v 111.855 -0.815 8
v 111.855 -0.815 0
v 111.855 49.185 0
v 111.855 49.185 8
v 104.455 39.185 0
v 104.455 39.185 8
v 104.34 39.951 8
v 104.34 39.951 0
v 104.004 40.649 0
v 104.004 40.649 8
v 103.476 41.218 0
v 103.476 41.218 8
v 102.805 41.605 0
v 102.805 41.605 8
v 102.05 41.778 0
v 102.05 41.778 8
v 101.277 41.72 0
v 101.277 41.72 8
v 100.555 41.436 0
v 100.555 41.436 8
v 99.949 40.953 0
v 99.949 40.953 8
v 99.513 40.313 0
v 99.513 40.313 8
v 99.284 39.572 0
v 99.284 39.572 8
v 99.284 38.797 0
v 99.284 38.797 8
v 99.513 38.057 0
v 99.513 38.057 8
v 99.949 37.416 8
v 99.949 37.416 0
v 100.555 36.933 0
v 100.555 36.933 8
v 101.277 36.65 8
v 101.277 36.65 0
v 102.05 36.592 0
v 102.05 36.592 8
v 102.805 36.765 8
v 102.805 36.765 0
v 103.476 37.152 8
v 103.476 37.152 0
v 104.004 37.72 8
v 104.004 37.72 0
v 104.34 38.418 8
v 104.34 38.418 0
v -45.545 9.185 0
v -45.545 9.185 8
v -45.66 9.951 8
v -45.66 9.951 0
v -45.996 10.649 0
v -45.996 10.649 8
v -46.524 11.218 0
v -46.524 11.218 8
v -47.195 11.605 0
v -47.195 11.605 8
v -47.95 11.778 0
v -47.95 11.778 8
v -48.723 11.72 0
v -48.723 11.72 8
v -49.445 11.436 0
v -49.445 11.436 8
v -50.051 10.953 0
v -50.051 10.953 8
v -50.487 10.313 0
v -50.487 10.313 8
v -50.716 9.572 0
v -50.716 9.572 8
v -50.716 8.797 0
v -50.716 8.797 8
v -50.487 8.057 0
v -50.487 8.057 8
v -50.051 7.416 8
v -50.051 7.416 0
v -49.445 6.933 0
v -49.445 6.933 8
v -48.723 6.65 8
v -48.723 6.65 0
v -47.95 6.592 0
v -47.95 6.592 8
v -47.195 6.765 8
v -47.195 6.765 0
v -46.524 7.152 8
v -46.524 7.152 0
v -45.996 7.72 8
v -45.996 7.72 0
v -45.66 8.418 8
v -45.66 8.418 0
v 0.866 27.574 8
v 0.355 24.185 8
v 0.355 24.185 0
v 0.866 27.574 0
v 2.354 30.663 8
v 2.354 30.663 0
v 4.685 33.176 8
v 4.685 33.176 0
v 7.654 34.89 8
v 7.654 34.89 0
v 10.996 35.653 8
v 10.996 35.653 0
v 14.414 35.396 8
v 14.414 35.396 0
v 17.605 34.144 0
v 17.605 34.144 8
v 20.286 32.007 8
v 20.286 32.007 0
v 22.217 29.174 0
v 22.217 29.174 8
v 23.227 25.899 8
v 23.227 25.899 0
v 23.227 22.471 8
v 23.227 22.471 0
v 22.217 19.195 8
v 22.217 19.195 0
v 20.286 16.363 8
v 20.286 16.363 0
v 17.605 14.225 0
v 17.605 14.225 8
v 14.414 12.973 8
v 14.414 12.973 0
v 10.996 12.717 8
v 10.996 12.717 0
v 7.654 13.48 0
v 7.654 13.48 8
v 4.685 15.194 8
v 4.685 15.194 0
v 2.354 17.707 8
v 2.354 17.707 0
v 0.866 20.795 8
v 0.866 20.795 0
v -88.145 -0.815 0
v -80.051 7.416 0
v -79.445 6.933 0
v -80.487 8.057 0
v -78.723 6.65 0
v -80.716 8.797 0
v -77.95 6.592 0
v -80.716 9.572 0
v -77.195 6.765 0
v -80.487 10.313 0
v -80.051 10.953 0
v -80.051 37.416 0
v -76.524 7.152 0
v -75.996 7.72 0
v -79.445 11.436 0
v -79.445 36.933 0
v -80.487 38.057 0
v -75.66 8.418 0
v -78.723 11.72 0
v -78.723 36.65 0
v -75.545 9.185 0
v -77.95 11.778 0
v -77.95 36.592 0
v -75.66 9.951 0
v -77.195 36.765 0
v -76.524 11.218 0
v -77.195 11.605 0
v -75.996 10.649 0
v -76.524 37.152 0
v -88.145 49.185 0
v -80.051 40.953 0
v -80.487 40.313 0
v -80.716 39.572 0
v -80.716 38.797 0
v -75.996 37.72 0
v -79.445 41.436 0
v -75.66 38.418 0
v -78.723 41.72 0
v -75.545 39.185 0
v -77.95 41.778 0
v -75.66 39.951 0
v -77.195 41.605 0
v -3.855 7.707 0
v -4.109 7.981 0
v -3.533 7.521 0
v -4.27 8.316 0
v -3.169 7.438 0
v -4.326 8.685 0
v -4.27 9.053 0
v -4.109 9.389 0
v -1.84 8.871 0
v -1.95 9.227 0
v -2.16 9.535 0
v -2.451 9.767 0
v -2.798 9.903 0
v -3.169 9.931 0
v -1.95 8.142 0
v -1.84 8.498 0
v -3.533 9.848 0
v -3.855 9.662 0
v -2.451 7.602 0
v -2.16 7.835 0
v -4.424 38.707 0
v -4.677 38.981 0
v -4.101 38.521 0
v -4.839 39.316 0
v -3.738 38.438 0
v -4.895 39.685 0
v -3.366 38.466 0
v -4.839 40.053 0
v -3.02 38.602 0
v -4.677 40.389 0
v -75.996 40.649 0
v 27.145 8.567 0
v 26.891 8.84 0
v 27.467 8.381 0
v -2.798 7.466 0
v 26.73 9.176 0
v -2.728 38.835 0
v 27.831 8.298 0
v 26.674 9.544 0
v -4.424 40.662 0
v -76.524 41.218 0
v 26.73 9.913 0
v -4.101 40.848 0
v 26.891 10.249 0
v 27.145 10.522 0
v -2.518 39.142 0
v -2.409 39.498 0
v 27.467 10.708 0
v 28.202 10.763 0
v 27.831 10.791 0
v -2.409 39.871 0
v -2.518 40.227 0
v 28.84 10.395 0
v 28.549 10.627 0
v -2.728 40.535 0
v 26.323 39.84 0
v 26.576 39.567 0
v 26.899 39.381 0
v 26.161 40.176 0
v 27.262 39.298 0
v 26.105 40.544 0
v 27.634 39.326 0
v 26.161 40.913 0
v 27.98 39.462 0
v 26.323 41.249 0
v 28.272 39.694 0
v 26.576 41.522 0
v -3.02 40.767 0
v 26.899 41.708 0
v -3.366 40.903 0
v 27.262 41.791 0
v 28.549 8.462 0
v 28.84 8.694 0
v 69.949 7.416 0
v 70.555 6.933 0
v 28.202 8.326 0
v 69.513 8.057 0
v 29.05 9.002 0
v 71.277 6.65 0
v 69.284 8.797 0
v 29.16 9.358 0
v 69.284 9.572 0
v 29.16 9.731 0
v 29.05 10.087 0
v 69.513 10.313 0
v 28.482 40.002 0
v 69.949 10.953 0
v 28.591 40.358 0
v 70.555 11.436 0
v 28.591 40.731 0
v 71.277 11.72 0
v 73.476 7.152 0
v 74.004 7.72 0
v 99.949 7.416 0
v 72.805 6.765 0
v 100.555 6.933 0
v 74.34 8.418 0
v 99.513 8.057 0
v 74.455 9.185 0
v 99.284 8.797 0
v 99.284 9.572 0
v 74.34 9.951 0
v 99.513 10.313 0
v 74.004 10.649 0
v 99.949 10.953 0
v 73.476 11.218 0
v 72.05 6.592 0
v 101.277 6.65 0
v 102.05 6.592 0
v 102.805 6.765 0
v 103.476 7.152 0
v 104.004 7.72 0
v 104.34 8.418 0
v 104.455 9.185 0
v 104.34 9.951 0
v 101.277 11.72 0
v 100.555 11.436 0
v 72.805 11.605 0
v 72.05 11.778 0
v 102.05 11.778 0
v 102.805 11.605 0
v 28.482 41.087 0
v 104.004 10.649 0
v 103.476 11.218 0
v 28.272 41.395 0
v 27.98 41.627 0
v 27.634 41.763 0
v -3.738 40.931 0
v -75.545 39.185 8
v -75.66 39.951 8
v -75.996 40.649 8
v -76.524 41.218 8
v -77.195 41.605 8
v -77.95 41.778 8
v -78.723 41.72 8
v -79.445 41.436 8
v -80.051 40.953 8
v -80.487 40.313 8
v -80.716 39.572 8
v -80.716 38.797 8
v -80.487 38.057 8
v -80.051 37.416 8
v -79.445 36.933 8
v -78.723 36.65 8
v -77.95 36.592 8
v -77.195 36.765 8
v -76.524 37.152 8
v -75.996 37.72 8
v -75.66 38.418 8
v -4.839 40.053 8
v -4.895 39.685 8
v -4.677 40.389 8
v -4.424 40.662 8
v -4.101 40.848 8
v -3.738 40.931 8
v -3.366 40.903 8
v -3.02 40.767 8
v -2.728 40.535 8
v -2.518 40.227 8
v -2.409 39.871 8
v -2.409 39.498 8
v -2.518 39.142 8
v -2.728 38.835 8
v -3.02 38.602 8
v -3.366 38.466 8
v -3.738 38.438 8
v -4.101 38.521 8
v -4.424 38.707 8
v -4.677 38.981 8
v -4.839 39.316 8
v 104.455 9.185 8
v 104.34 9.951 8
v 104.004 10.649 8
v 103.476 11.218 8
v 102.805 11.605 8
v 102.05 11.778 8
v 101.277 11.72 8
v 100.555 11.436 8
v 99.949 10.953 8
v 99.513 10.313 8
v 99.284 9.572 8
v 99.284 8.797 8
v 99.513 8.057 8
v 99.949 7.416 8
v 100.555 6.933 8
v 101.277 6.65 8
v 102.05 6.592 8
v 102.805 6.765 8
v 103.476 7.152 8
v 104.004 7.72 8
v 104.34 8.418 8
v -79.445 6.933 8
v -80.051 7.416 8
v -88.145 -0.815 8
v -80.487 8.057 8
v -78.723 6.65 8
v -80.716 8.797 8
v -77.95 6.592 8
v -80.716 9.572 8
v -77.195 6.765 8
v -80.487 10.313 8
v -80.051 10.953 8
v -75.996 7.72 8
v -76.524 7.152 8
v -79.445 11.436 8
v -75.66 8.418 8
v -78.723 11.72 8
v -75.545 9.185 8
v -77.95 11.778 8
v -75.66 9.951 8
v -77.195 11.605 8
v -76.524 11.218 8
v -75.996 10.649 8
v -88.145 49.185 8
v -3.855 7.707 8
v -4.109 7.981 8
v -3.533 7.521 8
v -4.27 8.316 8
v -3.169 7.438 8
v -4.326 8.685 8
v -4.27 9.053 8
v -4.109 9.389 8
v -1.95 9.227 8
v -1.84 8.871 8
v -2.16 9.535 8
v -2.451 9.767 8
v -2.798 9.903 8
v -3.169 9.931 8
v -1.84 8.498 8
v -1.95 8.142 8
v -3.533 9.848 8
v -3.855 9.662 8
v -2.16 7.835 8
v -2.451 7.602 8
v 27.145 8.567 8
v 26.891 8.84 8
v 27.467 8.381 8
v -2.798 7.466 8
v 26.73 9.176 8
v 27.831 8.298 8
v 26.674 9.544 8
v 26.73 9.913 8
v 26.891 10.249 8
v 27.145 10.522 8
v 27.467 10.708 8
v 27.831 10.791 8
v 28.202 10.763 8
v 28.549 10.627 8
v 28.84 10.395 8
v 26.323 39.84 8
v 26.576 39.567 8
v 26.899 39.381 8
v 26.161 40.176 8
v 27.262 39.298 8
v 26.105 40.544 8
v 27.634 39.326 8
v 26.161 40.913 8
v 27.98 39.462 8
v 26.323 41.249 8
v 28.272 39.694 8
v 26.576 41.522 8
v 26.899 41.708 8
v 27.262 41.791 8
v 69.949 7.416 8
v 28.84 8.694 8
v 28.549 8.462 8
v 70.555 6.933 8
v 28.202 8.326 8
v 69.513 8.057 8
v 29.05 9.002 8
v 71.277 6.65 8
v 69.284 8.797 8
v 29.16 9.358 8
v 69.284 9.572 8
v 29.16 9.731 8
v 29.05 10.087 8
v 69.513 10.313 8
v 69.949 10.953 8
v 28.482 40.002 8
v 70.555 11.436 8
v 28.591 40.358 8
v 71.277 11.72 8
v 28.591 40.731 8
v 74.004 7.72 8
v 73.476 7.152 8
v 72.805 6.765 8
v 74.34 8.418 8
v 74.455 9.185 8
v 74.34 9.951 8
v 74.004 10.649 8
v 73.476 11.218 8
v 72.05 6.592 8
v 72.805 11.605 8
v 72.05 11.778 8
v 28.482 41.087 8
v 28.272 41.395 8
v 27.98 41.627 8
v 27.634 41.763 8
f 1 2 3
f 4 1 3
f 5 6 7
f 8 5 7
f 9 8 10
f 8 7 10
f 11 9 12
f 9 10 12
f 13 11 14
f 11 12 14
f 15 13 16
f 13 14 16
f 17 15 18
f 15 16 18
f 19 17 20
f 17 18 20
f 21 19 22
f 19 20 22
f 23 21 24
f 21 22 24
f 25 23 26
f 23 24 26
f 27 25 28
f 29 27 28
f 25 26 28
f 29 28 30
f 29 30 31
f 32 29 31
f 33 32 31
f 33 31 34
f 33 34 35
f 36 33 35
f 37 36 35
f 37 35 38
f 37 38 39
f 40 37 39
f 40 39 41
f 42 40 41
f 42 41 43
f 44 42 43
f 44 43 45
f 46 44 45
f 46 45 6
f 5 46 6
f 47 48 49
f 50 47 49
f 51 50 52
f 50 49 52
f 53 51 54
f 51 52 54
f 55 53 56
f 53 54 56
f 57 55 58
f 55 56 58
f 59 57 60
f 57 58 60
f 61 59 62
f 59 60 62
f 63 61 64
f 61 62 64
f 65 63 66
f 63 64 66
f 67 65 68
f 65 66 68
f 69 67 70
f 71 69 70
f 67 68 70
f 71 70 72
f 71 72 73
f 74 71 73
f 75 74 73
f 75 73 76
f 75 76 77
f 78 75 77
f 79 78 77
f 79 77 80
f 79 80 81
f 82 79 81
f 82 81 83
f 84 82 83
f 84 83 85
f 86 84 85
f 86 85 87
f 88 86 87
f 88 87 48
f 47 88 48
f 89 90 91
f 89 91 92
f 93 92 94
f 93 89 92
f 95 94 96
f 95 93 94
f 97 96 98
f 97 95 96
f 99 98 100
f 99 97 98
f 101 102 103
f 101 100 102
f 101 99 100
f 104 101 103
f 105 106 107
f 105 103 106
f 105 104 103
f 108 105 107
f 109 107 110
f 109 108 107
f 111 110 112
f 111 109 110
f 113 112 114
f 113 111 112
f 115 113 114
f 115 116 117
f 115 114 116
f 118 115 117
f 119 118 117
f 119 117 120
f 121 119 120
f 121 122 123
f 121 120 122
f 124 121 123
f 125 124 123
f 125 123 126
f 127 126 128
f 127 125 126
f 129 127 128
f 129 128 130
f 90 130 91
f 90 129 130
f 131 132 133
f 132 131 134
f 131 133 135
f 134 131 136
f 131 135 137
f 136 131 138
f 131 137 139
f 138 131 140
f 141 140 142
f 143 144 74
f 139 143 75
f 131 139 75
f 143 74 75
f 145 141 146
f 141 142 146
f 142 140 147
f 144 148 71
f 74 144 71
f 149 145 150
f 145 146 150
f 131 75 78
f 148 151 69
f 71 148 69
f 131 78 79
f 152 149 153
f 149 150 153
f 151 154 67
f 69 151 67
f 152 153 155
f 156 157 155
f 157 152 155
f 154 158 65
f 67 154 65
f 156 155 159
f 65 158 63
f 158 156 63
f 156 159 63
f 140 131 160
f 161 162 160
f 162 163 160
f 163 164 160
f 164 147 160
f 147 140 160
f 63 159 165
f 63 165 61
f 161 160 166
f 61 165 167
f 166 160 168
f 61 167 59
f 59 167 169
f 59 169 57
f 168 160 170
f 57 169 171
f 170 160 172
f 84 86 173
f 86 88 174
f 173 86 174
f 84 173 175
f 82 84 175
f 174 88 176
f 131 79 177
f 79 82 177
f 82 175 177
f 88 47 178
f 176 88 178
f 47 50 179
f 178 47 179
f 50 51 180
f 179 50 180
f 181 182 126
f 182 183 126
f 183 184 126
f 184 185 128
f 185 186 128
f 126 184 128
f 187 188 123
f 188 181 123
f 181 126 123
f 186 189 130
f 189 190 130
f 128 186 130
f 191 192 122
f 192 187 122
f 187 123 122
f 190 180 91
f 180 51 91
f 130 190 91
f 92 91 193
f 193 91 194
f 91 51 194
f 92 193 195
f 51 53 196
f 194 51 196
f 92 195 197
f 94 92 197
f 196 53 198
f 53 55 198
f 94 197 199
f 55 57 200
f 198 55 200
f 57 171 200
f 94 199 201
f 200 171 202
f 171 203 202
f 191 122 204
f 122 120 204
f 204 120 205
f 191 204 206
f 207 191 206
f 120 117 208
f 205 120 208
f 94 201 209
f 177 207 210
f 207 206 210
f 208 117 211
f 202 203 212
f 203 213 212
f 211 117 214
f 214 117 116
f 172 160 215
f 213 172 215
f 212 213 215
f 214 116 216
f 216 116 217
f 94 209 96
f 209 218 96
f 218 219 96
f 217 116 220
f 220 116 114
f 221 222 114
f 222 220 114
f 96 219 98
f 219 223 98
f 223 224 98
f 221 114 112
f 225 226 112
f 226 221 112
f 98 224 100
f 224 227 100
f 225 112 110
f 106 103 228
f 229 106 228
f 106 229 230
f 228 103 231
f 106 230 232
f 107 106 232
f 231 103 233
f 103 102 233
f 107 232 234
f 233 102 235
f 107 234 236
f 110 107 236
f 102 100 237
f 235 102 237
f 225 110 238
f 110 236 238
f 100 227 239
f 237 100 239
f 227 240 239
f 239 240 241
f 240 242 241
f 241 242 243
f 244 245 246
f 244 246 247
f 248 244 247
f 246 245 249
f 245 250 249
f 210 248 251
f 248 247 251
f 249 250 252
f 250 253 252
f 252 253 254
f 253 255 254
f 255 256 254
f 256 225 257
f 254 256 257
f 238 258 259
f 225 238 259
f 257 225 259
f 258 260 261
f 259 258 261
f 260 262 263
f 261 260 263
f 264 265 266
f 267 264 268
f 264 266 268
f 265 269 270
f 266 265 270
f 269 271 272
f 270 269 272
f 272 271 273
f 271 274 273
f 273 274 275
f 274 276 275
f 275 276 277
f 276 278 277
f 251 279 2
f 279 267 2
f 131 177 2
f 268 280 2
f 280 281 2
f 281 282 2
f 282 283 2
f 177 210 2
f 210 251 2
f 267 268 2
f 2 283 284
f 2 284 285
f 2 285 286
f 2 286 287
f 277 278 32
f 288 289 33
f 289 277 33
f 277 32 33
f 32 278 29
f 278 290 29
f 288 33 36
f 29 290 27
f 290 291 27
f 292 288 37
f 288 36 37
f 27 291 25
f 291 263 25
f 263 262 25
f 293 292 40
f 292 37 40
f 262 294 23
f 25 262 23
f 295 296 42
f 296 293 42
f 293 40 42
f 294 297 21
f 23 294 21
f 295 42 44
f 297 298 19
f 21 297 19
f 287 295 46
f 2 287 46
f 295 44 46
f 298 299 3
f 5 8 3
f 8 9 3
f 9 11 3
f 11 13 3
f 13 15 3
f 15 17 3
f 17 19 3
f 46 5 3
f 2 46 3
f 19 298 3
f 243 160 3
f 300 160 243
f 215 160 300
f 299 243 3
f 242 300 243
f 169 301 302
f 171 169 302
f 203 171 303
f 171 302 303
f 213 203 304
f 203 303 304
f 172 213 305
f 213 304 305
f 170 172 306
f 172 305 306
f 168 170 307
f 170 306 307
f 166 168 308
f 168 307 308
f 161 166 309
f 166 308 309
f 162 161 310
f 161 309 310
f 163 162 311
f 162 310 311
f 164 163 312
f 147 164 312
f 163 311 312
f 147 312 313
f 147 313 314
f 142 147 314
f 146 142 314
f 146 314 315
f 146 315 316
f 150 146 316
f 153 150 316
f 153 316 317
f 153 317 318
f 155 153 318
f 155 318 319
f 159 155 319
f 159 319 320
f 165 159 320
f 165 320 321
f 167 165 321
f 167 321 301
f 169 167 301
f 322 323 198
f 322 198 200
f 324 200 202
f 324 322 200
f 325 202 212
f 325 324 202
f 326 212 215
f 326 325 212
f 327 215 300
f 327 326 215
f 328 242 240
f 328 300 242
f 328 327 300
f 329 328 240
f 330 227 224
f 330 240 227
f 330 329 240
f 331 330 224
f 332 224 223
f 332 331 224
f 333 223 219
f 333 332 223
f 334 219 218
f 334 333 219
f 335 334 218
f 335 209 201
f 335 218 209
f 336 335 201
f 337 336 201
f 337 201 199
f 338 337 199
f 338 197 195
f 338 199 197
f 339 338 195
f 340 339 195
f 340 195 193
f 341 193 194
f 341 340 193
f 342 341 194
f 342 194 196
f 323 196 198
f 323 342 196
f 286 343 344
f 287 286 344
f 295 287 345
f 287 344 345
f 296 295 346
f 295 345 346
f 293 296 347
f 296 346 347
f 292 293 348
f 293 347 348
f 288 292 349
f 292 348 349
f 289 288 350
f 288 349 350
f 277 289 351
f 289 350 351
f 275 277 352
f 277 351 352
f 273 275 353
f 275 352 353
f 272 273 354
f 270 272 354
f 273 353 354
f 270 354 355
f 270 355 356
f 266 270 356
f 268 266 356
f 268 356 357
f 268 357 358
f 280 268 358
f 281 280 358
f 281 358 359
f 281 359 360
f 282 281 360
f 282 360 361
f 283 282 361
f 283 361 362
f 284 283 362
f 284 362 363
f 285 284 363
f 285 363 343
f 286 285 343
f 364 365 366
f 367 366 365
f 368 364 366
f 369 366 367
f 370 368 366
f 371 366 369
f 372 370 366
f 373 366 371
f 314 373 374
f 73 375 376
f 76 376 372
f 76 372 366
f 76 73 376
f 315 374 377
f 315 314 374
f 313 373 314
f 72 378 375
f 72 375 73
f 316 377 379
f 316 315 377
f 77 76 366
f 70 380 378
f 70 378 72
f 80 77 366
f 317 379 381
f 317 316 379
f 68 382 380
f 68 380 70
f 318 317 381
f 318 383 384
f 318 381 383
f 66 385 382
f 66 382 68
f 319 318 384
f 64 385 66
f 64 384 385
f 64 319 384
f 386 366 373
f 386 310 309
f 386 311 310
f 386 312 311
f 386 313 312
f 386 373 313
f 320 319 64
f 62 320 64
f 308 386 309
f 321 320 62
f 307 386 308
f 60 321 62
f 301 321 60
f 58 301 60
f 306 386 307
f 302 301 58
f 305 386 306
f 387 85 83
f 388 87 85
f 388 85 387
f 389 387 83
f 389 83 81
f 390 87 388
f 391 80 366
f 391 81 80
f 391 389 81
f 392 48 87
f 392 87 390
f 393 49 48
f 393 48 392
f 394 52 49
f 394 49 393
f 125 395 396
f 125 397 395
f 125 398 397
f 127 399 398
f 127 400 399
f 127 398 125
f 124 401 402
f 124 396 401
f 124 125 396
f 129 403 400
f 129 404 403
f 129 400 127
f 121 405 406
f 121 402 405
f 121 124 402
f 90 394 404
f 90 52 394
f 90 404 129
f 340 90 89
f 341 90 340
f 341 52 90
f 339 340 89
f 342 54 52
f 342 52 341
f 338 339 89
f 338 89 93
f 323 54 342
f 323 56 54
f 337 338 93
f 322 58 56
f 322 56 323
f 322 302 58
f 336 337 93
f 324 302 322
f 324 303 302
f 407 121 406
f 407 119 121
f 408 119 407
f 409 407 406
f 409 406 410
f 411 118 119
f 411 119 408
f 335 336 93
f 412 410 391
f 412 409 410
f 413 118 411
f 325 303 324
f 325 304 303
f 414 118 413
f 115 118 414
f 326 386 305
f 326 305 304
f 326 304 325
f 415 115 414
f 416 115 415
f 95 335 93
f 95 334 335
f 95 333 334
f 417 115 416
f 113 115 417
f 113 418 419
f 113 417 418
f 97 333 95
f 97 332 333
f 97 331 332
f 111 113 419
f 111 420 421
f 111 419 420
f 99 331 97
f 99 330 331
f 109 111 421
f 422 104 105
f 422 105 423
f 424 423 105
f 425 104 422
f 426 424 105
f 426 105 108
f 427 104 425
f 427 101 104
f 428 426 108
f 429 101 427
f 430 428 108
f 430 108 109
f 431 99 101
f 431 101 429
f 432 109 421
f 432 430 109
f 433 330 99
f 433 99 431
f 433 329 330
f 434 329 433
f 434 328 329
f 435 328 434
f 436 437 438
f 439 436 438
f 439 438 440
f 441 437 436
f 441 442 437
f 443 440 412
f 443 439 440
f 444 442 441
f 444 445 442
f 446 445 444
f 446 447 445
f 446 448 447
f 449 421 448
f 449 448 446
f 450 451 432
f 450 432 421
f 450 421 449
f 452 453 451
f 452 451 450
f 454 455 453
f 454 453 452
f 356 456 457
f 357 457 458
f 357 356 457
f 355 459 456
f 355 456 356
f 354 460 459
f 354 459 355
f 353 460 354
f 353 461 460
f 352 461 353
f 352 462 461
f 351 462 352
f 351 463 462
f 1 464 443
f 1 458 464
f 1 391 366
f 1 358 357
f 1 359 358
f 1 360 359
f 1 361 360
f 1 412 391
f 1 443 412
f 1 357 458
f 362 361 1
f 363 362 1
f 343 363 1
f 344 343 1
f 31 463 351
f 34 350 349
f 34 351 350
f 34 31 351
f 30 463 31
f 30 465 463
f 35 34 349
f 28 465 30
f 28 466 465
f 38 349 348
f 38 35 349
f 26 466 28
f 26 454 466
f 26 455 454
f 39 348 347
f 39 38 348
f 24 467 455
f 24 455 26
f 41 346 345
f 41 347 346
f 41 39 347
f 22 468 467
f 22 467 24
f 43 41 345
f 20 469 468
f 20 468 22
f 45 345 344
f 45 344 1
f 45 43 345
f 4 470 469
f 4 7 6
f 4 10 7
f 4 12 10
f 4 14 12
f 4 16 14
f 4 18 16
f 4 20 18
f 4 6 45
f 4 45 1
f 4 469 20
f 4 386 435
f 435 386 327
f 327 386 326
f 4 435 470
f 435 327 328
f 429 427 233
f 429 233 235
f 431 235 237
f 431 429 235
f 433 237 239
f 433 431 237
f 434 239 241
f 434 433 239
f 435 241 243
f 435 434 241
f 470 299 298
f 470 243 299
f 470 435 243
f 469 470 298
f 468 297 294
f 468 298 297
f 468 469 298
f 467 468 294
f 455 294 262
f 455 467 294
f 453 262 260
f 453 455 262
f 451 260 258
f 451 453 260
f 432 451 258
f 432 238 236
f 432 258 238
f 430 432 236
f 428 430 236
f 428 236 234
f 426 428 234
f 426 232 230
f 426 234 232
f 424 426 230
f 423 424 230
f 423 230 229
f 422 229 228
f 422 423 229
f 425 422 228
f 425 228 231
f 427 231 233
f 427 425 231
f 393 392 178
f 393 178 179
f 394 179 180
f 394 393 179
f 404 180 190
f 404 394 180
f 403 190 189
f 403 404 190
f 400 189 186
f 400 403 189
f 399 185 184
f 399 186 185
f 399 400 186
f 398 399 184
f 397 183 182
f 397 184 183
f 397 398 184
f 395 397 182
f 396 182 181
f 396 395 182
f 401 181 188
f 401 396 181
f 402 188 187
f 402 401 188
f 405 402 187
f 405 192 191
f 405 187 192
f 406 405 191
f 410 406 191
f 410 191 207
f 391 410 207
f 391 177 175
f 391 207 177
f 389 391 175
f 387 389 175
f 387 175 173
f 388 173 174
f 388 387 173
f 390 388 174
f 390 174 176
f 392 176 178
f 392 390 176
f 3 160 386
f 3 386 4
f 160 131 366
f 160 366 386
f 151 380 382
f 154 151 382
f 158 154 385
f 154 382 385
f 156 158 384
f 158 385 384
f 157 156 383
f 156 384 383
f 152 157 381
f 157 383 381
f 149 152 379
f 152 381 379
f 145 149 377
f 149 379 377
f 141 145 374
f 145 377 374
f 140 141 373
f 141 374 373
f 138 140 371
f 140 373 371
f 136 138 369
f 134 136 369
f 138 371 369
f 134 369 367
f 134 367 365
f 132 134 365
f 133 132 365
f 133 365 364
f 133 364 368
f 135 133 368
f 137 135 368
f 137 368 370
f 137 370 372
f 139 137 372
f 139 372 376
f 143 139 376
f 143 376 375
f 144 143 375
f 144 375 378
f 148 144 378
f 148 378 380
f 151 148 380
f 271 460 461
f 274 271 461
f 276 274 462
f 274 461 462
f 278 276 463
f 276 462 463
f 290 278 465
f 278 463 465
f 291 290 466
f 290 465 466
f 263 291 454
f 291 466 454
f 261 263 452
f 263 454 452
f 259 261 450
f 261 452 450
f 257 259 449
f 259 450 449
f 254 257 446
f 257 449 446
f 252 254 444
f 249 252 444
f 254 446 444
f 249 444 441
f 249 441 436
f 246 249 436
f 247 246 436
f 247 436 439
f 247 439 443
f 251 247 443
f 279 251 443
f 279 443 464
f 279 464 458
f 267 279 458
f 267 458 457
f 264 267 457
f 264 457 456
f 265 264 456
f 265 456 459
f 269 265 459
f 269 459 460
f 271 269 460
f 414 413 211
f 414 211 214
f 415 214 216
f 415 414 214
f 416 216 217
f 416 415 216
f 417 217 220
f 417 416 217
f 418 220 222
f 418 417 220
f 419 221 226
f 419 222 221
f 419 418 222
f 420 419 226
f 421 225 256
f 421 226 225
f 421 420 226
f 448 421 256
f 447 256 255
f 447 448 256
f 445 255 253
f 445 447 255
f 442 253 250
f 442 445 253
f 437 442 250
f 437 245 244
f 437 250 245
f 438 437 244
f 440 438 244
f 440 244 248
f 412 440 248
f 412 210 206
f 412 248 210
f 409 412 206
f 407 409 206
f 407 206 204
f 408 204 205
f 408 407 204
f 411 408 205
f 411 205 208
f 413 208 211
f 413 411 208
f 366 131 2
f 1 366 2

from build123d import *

# Parameters (mm, degrees)
IZIM1_W                              = 200
IZIM1_H                              = 50
Y_KSEKLIK_EKSTR_ZYON1_DEPTH          = 8
M5_HELISARMAL_I_IN_Z_VANA_MATKAB_1_D = 5.2
KES_EKSTR_ZYON1_DEPTH                = 10
KES_EKSTR_ZYON1_DEPTH_BACK           = 10
IZIM5_R                              = 1.25
IZIM5_R_2                            = 11.5
M5_HELISARMAL_I_IN_Z_VANA_MATKAB_2_D = 5.2


with BuildPart() as part:
    # Çizim1 → Yükseklik-Ekstrüzyon1 (new body)
    with BuildSketch(Plane.XY):
        with Locations((11.855409505, 24.184782609)):
            Rectangle(IZIM1_W, IZIM1_H)
    extrude(amount=Y_KSEKLIK_EKSTR_ZYON1_DEPTH)

    # M5 Helisarmal için Zıvana matkabı1 (through all)
    with Locations(Plane(origin=(0, 0, 0), x_dir=(-1, 0, 0), z_dir=(0, 0, -1))):
        with Locations((-101.855409505, 39.184782609), (-101.855409505, 9.184782609), (78.144590495, 9.184782609), (78.144590495, 39.184782609)):
            Hole(M5_HELISARMAL_I_IN_Z_VANA_MATKAB_1_D / 2)

    # Çizim5 → Kes-Ekstrüzyon1 (cut, two sides: drawn at the far end of the back side and taken through both)
    with BuildSketch(Plane(origin=(0, 0, 0), x_dir=(-1, 0, 0), z_dir=(0, 0, -1)).offset(-KES_EKSTR_ZYON1_DEPTH_BACK)):
        with Locations((3.644590495, 39.684782609)):
            Circle(IZIM5_R)
        with Locations((3.075905377, 8.684782609)):
            Circle(IZIM5_R)
        with Locations((-27.924094623, 9.544465449)):
            Circle(IZIM5_R)
        with Locations((-27.355409505, 40.544465449)):
            Circle(IZIM5_R)
        with Locations((-11.855409505, 24.184782609)):
            Circle(IZIM5_R_2)
    extrude(amount=KES_EKSTR_ZYON1_DEPTH + KES_EKSTR_ZYON1_DEPTH_BACK, mode=Mode.SUBTRACT)

    # M5 Helisarmal için Zıvana matkabı2 (through all)
    with Locations(Plane(origin=(71.855409505, 9.184782609, 0), x_dir=(-1, 0, 0), z_dir=(0, 0, -1))):
        with Locations((0, 0), (120, 0)):
            Hole(M5_HELISARMAL_I_IN_Z_VANA_MATKAB_2_D / 2)


solid = part.part
